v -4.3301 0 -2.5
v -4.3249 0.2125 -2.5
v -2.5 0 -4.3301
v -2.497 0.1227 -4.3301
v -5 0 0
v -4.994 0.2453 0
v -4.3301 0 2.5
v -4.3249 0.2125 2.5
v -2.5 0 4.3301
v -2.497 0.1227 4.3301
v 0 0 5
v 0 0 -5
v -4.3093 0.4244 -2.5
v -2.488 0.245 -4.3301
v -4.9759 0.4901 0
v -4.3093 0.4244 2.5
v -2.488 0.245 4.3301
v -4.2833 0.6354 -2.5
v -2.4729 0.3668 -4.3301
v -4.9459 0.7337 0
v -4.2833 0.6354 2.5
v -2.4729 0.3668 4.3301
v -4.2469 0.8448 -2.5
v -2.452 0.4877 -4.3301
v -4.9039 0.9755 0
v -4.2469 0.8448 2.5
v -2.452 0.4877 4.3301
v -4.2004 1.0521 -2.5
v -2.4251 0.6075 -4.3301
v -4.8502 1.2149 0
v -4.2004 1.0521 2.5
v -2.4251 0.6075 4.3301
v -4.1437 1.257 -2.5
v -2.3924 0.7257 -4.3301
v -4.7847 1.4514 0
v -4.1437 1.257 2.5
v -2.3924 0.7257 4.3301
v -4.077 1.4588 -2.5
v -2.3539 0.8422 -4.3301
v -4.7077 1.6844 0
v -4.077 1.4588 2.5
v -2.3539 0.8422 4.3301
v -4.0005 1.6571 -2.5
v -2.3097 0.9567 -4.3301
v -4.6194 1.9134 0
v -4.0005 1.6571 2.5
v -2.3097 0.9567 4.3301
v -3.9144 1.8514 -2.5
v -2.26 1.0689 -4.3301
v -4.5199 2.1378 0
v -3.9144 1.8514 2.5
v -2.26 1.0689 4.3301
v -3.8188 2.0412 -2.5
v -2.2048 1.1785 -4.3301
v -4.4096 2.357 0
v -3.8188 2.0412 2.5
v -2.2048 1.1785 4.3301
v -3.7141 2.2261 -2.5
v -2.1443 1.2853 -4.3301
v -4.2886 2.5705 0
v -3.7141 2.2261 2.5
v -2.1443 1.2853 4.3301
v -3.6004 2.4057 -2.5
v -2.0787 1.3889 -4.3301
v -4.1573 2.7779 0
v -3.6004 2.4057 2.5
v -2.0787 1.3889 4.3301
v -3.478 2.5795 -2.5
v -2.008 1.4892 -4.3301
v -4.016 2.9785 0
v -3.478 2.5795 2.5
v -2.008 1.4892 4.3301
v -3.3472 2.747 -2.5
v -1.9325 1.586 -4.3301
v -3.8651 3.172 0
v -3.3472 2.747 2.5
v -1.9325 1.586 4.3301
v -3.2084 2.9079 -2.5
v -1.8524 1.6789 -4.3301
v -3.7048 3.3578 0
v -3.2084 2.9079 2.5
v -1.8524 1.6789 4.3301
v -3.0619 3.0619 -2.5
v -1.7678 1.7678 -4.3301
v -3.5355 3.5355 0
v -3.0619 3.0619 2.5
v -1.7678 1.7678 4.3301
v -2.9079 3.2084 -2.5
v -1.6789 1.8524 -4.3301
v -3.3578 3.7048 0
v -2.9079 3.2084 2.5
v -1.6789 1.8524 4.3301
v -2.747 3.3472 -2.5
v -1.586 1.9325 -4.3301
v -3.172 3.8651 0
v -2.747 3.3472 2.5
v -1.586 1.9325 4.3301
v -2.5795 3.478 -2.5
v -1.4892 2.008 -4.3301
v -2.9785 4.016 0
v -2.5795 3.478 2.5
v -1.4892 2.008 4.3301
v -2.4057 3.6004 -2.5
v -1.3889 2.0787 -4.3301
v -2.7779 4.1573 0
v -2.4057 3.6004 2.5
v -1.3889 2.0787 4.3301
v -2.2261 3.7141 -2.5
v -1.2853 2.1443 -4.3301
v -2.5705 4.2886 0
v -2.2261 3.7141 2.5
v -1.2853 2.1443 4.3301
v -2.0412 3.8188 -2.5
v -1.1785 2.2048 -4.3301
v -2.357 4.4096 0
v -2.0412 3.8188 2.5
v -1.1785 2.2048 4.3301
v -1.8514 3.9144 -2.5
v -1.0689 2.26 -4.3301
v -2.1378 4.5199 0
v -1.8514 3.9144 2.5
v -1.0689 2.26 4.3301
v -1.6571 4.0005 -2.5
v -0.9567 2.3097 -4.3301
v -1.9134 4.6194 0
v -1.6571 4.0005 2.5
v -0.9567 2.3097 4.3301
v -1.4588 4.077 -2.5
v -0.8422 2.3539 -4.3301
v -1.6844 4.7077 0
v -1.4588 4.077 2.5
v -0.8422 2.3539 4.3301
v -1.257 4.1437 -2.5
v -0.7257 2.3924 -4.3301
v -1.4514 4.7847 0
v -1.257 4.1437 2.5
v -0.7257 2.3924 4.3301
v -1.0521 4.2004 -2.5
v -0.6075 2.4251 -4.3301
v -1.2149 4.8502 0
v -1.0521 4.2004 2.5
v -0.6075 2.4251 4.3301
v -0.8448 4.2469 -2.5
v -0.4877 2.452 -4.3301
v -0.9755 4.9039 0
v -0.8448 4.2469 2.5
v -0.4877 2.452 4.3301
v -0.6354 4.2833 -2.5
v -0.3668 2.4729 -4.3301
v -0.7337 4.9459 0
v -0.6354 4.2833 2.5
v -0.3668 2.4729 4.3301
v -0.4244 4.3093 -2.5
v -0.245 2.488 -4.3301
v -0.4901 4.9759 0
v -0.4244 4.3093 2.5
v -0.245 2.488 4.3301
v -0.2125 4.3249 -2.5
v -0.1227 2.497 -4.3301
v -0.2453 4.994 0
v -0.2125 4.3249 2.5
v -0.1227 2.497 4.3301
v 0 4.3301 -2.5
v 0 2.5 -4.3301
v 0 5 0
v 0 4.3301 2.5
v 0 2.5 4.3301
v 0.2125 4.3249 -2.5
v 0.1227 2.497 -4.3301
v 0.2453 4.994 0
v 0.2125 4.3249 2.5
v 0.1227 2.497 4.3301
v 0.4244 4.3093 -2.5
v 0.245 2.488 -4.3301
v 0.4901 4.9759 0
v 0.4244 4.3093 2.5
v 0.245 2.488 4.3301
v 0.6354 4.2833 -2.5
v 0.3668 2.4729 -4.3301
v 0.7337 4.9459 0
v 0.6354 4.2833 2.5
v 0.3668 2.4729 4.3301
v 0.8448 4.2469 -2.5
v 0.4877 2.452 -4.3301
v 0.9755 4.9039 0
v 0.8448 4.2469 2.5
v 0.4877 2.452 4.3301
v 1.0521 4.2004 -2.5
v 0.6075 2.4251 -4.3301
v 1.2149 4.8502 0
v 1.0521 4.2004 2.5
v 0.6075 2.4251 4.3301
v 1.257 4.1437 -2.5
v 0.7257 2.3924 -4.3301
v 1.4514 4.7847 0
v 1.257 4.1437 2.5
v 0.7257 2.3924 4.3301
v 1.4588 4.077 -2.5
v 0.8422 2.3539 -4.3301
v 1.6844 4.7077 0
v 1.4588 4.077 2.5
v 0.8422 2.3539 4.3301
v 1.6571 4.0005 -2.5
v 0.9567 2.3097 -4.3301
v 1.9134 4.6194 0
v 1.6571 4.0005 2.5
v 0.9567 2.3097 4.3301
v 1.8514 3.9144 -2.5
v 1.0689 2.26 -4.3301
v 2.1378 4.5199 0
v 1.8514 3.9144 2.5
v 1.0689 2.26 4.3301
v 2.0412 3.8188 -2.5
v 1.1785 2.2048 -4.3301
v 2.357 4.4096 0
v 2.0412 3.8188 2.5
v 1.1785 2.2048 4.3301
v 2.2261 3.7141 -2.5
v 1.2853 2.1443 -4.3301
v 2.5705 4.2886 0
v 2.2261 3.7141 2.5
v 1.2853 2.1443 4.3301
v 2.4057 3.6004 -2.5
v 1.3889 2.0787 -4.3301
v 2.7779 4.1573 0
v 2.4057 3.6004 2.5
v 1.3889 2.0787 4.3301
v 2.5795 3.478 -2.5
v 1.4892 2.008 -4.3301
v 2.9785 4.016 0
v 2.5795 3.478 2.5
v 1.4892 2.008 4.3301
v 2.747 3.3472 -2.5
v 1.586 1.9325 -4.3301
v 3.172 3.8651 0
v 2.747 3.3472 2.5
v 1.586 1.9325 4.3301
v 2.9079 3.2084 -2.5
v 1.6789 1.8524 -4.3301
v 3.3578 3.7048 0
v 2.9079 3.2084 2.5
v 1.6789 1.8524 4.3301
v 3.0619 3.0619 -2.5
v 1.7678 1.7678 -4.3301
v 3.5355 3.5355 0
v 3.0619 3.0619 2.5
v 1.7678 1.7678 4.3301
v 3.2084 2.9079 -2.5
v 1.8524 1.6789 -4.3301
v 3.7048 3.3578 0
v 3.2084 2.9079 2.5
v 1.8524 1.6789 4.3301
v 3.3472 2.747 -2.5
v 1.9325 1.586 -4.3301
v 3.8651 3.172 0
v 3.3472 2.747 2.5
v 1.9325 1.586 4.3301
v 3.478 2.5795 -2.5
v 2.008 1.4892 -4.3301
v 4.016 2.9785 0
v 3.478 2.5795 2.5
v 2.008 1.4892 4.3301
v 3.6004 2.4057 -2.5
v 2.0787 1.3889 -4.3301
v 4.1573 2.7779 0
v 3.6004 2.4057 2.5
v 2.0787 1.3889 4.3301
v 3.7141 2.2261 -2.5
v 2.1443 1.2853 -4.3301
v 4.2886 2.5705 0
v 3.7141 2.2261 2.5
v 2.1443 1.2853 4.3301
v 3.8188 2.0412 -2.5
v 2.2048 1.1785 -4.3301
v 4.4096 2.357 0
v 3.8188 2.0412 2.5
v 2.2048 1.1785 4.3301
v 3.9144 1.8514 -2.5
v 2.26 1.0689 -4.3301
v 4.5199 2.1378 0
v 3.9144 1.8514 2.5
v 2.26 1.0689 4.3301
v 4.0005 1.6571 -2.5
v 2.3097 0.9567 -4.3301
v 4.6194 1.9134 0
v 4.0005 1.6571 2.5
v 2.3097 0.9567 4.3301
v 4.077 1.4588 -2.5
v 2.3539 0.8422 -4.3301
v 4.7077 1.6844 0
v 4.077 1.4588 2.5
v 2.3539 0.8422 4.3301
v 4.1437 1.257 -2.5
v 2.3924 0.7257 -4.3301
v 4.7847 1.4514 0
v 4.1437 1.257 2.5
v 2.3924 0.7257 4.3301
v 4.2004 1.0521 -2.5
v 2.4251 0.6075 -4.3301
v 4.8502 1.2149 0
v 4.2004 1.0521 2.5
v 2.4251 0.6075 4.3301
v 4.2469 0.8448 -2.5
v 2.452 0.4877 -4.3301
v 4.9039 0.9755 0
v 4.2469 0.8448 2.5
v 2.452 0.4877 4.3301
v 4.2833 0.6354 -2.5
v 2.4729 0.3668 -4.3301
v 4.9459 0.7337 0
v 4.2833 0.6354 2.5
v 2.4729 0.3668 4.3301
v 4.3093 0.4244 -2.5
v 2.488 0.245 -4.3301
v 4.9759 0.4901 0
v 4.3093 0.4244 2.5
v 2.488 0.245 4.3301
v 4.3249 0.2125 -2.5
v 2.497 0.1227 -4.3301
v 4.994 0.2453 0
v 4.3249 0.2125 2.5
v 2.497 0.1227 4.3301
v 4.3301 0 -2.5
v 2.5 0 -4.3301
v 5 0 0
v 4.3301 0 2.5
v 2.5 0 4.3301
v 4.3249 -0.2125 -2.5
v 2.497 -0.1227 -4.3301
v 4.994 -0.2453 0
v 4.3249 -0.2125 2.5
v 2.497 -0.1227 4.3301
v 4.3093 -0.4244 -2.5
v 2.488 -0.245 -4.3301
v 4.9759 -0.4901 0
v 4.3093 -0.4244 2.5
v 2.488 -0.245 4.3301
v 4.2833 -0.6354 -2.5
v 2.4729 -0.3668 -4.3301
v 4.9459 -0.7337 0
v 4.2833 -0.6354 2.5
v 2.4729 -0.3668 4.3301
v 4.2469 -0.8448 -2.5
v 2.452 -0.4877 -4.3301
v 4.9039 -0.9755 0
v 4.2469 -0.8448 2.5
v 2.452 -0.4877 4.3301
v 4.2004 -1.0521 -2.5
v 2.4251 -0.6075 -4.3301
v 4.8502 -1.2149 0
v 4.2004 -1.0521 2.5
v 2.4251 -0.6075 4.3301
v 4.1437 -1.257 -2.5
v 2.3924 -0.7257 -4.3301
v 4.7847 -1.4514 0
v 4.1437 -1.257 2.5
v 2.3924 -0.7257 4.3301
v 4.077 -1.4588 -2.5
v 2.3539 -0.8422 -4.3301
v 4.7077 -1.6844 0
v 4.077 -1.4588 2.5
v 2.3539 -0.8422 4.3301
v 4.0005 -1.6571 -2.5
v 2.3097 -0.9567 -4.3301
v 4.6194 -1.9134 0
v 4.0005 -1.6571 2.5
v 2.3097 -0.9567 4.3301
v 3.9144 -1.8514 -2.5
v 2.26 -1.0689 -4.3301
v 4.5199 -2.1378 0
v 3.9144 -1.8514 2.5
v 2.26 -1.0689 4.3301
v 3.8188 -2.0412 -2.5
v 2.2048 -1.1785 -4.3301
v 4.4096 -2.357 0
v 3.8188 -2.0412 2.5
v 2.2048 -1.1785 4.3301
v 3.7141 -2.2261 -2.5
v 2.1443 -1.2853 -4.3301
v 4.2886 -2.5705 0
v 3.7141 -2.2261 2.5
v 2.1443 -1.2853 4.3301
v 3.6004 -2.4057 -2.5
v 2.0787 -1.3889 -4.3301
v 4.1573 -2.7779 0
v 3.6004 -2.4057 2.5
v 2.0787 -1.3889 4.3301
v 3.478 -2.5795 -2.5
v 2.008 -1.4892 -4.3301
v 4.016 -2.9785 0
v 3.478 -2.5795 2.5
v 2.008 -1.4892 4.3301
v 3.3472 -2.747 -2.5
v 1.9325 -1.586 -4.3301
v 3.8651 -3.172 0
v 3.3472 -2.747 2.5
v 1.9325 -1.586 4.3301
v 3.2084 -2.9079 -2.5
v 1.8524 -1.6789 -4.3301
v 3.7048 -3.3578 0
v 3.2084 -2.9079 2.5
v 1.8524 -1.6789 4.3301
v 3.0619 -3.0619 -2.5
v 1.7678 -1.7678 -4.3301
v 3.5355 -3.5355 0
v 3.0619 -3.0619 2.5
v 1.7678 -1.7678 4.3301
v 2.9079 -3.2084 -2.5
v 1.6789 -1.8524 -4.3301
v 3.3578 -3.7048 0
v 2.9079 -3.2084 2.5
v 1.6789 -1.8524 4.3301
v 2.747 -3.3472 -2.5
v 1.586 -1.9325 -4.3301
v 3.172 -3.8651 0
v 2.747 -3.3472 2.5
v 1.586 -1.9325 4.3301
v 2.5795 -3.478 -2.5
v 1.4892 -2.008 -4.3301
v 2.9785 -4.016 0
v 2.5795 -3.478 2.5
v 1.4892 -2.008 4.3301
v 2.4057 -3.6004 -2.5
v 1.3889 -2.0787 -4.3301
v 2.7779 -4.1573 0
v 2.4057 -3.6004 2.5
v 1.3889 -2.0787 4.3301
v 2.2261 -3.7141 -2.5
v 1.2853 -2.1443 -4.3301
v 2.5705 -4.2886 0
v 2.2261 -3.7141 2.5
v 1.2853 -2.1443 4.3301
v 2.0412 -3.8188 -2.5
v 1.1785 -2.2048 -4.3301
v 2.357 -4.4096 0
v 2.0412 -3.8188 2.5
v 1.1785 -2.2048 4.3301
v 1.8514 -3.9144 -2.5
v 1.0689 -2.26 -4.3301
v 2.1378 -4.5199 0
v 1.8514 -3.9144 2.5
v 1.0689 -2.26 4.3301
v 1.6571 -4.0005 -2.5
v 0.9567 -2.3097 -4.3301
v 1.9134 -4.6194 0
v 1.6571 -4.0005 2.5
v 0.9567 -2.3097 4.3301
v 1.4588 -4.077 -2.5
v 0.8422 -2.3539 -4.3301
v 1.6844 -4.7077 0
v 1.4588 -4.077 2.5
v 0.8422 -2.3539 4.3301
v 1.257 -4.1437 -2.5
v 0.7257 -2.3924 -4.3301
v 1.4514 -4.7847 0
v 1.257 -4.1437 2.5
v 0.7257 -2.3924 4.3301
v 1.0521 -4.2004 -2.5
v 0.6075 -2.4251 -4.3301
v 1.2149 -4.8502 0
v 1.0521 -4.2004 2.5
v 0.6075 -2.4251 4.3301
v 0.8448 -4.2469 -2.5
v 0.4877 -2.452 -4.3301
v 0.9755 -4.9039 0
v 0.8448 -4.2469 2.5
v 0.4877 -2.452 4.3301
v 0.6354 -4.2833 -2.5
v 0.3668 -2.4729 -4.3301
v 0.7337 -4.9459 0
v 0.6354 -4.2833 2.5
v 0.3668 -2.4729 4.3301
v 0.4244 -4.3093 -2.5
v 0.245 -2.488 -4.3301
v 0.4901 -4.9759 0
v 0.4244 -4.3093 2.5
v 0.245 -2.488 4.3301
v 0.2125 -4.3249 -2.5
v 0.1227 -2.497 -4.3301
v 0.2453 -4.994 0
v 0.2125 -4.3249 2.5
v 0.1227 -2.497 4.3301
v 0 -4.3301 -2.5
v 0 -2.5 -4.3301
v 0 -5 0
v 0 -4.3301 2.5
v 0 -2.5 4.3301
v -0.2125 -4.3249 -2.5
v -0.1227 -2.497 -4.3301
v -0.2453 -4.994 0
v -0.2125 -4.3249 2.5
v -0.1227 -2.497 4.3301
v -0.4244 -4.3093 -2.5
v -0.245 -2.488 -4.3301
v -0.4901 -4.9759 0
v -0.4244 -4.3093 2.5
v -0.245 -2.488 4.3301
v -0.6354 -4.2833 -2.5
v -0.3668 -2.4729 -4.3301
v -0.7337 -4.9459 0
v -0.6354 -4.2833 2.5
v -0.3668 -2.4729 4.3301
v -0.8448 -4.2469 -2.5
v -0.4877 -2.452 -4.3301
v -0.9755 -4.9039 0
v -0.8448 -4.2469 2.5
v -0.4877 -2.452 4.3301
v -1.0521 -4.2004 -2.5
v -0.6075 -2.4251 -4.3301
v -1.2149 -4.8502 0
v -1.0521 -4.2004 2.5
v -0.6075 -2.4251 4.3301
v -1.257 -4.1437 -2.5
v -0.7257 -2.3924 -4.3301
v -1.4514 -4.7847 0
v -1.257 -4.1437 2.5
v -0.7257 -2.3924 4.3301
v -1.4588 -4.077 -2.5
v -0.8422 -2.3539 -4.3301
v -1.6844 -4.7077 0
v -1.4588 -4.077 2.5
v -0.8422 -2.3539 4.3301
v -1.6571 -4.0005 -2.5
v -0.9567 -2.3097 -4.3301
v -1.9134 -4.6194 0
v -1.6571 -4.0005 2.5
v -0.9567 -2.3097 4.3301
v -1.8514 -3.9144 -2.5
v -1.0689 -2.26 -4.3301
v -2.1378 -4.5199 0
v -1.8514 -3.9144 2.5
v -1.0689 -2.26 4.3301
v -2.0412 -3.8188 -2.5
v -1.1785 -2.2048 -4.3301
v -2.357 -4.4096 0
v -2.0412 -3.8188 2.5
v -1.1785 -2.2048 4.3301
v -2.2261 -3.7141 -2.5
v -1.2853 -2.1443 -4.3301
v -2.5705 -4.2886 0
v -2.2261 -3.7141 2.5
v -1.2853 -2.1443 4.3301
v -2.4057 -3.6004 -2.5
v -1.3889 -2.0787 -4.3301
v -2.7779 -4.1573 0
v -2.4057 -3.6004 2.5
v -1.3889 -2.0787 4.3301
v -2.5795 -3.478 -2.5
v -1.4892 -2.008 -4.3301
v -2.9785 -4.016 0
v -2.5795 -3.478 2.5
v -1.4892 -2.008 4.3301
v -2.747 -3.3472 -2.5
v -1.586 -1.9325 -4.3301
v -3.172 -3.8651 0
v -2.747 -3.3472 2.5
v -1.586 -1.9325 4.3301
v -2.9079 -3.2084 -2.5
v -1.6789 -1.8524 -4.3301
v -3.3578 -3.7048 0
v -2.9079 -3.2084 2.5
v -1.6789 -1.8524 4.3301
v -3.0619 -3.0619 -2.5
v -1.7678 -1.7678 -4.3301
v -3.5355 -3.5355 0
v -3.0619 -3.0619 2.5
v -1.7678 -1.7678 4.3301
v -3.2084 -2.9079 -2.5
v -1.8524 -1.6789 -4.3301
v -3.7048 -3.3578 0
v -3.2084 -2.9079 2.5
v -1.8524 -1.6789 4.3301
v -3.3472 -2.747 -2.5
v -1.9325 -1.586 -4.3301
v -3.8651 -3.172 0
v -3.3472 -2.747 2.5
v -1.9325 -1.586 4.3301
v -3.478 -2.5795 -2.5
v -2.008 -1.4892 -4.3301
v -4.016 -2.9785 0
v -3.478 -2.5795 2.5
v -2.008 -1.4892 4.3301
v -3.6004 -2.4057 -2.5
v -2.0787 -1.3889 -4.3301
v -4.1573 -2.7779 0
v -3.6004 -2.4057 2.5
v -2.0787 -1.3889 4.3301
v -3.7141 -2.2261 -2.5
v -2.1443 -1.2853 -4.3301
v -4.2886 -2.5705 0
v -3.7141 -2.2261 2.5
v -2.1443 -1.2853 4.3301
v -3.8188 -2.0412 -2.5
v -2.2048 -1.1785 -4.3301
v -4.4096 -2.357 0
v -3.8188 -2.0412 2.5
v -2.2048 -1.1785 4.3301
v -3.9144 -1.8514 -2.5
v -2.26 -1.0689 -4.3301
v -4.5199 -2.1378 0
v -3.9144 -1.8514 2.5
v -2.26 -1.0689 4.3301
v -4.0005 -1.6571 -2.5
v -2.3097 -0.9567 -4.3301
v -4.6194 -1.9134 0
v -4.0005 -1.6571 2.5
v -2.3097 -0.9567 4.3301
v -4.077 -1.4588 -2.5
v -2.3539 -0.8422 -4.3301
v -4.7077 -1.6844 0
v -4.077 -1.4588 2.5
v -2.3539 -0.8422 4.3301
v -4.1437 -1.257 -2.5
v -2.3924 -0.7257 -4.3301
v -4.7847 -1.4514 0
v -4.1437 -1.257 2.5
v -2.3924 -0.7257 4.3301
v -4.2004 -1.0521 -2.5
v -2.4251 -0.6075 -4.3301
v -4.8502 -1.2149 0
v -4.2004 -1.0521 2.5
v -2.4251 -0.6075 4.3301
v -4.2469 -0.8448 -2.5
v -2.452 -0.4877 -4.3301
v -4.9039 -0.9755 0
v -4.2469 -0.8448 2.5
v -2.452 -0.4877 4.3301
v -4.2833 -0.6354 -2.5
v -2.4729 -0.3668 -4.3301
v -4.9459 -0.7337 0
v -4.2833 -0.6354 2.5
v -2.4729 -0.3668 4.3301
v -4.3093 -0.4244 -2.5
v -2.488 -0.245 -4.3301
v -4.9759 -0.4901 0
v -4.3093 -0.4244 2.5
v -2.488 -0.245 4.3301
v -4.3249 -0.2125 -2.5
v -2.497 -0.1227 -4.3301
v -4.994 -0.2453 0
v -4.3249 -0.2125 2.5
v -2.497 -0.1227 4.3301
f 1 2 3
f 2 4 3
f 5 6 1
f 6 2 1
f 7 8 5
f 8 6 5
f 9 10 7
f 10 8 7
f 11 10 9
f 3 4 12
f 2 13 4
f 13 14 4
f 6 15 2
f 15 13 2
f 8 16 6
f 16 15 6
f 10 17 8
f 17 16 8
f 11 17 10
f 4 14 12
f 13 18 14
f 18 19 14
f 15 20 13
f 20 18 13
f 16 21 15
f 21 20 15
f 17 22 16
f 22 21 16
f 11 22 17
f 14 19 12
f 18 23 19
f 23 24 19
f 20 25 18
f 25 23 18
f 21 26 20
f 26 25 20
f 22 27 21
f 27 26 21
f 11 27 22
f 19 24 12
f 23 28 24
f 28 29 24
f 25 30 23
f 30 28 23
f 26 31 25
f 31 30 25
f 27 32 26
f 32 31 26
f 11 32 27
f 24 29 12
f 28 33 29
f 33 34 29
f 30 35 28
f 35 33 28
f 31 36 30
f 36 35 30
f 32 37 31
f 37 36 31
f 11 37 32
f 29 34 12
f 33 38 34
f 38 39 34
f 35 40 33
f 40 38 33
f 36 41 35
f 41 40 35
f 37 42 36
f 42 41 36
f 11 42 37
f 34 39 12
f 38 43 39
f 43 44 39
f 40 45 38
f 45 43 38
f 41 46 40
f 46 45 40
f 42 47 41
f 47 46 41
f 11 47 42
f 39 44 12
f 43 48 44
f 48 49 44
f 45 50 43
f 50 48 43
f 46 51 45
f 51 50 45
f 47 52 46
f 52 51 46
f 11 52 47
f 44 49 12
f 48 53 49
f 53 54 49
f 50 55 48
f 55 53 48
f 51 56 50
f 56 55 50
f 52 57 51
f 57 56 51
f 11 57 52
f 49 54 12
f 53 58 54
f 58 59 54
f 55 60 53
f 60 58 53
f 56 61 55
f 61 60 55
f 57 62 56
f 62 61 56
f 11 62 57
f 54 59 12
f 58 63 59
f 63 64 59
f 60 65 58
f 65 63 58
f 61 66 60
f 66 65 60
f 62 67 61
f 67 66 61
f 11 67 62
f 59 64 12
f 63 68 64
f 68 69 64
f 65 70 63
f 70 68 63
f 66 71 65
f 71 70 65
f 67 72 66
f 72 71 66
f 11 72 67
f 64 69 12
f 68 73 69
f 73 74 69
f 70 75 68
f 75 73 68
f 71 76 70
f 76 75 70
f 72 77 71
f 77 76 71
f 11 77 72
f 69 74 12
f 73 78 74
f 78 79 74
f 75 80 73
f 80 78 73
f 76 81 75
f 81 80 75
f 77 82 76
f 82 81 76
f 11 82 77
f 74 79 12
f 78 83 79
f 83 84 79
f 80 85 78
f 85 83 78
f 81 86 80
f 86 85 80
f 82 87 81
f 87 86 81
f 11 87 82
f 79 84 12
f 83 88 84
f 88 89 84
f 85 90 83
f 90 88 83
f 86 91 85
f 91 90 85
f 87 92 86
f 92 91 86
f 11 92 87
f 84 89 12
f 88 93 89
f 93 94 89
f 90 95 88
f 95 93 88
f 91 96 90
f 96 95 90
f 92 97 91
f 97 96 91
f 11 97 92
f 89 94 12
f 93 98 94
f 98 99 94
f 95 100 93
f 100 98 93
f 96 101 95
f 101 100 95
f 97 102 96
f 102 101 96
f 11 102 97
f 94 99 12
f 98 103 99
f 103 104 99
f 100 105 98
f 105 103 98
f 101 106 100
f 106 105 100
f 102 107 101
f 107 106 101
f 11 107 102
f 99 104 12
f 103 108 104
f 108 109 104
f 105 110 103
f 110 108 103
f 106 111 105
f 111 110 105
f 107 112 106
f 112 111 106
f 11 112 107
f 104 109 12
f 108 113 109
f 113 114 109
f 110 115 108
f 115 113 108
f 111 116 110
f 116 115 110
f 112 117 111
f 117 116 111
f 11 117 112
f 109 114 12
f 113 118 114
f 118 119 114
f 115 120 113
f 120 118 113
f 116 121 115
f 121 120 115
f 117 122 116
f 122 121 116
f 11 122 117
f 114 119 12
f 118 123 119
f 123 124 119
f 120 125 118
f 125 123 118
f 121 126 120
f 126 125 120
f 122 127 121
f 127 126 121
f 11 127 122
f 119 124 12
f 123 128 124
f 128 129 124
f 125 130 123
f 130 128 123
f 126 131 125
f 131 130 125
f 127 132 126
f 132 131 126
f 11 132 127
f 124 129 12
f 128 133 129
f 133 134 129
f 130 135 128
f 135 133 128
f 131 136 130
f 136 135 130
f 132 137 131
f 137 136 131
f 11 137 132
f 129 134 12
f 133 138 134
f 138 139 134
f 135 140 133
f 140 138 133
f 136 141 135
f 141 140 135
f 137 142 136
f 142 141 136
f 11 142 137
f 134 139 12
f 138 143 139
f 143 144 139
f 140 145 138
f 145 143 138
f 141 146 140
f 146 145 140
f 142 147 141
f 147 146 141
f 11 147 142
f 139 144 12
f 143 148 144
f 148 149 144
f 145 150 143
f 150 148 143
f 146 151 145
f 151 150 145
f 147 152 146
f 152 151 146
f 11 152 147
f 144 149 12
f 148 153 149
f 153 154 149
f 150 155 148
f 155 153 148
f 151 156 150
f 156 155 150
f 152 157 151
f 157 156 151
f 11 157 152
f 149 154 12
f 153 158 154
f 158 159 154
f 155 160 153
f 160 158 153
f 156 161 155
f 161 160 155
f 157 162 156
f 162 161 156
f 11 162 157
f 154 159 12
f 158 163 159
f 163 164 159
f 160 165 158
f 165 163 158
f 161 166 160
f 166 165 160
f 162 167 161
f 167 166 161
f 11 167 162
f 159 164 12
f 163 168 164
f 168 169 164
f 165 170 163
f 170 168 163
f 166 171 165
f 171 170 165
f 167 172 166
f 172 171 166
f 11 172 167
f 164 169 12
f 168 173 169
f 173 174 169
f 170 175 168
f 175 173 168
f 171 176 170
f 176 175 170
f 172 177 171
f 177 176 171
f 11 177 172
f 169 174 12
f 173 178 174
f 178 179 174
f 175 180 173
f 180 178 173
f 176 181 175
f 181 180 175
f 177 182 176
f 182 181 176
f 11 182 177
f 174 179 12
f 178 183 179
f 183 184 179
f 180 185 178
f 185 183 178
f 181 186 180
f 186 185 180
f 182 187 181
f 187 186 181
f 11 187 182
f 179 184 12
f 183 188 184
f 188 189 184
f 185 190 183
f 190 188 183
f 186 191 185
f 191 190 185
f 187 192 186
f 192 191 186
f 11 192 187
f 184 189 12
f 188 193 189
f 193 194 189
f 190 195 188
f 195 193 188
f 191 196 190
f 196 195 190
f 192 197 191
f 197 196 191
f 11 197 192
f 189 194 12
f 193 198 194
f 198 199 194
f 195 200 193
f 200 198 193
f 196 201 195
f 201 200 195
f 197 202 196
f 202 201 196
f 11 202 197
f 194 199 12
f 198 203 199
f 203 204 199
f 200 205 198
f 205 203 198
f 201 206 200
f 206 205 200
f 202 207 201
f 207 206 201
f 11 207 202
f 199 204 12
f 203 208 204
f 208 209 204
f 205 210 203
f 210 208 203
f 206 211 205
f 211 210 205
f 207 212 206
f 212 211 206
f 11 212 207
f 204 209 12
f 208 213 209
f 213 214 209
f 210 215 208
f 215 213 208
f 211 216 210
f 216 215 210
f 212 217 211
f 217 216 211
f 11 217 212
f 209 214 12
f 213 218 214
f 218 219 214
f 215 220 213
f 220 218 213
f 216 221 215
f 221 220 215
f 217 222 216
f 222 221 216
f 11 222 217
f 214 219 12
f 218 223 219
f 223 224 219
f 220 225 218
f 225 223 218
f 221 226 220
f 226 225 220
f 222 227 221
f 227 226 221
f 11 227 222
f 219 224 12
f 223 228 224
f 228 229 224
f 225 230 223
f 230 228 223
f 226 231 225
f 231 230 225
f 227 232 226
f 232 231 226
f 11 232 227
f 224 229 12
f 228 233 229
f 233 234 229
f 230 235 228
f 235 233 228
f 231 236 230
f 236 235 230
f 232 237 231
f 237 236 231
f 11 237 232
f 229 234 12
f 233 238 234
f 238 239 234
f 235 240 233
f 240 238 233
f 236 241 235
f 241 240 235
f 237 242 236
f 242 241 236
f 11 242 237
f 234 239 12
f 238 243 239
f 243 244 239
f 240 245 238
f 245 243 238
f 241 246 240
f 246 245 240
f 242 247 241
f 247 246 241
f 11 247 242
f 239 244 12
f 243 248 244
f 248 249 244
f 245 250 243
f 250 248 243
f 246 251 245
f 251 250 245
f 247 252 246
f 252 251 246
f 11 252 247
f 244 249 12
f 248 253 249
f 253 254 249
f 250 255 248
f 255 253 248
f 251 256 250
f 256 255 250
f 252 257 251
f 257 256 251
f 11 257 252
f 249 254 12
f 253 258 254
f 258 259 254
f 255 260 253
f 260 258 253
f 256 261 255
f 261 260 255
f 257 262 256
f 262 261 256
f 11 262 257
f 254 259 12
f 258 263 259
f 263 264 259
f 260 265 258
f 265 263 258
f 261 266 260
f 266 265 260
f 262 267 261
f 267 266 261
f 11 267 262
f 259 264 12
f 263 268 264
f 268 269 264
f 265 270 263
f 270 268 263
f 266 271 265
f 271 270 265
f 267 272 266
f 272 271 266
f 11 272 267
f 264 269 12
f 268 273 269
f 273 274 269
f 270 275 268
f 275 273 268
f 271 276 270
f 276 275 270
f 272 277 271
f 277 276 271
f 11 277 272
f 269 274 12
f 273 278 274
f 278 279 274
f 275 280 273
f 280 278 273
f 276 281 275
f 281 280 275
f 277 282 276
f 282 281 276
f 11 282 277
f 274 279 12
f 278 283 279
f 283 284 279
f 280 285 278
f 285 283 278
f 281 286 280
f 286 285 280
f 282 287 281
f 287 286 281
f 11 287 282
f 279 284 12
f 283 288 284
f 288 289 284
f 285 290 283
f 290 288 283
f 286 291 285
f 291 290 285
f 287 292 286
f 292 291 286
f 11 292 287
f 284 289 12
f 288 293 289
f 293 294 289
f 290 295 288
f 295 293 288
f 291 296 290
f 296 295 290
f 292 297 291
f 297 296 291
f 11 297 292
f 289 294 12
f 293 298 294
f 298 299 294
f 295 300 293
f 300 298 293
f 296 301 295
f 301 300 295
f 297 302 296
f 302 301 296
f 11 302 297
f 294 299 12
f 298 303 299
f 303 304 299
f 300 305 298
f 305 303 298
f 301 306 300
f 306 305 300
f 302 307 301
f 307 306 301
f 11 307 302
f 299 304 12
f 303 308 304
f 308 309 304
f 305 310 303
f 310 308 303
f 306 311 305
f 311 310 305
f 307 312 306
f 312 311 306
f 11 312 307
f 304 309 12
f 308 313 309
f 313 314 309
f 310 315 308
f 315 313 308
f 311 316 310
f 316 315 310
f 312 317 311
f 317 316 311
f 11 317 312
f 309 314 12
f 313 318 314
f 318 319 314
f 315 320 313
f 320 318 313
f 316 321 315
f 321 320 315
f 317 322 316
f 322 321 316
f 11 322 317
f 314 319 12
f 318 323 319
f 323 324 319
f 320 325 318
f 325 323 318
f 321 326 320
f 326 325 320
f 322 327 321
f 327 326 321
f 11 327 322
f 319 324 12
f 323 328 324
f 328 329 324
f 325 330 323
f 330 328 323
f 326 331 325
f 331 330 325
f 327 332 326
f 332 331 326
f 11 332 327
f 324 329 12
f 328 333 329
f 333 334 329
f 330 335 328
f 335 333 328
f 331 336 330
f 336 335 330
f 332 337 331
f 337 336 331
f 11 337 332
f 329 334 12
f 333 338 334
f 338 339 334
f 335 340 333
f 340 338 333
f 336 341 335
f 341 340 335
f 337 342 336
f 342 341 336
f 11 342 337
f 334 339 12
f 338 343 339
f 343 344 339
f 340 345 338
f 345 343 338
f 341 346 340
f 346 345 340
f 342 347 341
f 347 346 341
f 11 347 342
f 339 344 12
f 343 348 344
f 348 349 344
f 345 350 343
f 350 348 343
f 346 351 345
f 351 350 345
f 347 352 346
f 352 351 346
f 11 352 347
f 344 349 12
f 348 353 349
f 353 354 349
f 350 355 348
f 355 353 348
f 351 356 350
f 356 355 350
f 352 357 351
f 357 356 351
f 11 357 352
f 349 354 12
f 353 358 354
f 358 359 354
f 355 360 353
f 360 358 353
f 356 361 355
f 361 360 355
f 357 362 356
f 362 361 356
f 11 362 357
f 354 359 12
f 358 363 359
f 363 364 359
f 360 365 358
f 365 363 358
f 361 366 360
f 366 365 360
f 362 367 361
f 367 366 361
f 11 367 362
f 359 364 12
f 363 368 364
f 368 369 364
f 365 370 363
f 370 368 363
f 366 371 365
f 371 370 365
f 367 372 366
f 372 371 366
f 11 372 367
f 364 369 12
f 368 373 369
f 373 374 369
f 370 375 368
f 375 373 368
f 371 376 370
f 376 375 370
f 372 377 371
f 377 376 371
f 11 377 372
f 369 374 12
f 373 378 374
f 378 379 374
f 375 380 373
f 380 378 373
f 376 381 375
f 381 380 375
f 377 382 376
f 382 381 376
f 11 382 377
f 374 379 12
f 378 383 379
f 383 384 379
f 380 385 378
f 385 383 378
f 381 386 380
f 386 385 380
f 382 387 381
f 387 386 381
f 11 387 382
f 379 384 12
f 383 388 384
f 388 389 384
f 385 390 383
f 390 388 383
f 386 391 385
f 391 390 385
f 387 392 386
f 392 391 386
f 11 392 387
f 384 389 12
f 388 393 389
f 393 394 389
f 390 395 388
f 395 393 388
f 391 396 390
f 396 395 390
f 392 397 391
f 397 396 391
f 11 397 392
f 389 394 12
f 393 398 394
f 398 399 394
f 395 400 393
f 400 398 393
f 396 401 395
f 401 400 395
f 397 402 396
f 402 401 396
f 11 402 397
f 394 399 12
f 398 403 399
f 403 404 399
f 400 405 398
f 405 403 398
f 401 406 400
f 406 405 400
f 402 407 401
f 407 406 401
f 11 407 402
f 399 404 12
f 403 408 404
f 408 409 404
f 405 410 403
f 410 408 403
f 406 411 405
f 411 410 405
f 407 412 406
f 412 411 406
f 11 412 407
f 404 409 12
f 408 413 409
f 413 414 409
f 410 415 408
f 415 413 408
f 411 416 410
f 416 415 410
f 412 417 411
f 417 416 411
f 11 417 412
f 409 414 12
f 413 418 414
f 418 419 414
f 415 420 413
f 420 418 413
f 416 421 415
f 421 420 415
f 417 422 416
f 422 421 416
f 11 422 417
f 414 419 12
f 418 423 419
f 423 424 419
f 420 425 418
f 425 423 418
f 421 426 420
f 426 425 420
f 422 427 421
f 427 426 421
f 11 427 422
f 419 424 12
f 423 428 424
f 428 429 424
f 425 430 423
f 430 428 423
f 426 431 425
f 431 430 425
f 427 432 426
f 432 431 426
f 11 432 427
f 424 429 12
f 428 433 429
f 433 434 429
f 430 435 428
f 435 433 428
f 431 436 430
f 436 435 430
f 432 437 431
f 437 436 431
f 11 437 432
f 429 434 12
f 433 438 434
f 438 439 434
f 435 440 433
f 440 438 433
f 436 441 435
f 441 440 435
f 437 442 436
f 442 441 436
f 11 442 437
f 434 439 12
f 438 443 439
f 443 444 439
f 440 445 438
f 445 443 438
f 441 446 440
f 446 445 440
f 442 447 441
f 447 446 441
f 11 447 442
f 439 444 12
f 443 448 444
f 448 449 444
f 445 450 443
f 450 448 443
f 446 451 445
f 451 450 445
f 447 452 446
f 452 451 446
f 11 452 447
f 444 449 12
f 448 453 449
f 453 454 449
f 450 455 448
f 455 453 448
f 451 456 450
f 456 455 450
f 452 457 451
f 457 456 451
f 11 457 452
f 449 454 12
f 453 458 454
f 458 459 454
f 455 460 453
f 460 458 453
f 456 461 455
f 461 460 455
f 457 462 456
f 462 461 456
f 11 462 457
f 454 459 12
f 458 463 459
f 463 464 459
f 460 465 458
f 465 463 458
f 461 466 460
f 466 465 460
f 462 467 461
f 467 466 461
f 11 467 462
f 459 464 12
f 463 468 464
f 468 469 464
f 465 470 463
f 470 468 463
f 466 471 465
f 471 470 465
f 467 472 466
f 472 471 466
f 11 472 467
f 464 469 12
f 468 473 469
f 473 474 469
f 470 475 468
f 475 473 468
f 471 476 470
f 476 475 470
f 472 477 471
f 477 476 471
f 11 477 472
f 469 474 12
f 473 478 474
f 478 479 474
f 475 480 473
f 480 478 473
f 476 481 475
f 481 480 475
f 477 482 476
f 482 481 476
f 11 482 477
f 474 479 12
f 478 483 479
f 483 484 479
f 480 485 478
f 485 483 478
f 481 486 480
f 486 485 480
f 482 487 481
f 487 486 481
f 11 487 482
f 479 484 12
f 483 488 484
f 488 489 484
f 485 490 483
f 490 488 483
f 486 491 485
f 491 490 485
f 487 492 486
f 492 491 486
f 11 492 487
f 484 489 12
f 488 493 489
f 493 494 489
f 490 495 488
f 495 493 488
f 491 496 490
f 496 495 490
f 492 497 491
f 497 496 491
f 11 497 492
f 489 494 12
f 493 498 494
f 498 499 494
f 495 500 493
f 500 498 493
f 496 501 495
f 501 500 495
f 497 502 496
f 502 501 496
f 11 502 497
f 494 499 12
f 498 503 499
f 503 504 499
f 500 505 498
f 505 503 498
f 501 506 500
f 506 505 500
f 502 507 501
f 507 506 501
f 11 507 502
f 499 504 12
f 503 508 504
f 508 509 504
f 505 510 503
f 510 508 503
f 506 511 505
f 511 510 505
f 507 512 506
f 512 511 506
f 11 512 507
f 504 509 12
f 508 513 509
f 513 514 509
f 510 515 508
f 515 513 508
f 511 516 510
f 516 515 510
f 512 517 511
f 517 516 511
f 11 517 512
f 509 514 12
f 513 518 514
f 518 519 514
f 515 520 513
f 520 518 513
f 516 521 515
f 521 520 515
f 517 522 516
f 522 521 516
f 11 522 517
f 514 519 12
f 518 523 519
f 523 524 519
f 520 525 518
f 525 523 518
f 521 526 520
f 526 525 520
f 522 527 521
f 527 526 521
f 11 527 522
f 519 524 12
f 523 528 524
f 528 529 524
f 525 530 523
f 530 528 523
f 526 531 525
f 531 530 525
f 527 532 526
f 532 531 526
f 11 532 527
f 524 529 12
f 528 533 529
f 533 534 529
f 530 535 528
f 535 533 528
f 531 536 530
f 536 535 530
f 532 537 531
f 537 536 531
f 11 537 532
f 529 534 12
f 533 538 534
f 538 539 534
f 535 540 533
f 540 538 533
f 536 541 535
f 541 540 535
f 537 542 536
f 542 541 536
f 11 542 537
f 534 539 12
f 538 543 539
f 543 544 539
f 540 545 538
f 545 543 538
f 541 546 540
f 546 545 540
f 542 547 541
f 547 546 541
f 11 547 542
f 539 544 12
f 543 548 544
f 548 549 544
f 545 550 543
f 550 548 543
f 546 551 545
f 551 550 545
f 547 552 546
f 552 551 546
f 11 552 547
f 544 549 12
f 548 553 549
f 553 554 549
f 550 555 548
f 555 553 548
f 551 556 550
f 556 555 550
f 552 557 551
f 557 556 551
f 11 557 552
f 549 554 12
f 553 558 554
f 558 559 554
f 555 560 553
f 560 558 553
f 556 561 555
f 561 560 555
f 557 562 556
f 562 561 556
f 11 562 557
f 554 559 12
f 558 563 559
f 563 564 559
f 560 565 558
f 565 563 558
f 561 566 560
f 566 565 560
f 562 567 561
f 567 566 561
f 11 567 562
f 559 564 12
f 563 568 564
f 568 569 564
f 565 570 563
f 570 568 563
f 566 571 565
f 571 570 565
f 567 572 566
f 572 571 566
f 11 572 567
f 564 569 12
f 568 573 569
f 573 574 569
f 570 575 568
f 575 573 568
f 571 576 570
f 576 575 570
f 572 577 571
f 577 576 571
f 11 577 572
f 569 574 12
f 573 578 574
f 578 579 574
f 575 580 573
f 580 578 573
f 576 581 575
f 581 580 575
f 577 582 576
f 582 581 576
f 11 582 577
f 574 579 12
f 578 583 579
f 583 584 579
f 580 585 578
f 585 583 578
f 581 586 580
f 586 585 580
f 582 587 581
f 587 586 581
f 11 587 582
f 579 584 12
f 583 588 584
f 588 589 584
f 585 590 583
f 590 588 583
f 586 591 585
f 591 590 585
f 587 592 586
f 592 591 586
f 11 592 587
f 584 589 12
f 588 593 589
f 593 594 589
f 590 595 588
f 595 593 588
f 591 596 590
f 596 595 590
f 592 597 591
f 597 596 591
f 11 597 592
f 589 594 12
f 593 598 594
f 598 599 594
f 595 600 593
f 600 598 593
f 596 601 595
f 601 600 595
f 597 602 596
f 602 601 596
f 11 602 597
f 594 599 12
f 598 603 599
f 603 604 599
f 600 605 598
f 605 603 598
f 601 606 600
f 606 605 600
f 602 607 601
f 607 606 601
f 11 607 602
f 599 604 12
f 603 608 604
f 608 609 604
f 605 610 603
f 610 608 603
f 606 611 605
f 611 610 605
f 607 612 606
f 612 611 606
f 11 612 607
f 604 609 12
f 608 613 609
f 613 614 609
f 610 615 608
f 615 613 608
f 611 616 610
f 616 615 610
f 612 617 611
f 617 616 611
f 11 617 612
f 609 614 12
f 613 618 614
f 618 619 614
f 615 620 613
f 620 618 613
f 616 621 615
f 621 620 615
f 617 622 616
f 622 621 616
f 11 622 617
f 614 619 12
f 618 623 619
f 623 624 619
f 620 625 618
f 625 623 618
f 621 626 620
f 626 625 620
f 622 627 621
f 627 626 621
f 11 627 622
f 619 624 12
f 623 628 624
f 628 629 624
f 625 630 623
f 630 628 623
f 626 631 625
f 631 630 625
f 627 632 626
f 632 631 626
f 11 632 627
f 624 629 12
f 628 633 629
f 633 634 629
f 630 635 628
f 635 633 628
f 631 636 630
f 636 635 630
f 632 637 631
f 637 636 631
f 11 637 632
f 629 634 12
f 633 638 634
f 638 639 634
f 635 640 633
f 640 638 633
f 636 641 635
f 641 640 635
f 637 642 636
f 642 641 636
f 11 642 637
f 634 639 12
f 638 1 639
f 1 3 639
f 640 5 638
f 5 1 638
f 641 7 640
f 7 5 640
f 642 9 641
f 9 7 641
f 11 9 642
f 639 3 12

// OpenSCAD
// Auto-generated from tests/data/feature_fixtures_manifest.json
// fixture: revolve_semicircle_profile
// fixture_type: revolve
// description: Semicircle-like profile revolved around Z; generic Phase 1 sphere-like revolve.
$fn = 96;

profile = [
    [0.000000, -5.000000],
    [2.500000, -4.330127],
    [4.330127, -2.500000],
    [5.000000, 0.000000],
    [4.330127, 2.500000],
    [2.500000, 4.330127],
    [0.000000, 5.000000]
];

rotate_extrude($fn=128) polygon(points=profile);
